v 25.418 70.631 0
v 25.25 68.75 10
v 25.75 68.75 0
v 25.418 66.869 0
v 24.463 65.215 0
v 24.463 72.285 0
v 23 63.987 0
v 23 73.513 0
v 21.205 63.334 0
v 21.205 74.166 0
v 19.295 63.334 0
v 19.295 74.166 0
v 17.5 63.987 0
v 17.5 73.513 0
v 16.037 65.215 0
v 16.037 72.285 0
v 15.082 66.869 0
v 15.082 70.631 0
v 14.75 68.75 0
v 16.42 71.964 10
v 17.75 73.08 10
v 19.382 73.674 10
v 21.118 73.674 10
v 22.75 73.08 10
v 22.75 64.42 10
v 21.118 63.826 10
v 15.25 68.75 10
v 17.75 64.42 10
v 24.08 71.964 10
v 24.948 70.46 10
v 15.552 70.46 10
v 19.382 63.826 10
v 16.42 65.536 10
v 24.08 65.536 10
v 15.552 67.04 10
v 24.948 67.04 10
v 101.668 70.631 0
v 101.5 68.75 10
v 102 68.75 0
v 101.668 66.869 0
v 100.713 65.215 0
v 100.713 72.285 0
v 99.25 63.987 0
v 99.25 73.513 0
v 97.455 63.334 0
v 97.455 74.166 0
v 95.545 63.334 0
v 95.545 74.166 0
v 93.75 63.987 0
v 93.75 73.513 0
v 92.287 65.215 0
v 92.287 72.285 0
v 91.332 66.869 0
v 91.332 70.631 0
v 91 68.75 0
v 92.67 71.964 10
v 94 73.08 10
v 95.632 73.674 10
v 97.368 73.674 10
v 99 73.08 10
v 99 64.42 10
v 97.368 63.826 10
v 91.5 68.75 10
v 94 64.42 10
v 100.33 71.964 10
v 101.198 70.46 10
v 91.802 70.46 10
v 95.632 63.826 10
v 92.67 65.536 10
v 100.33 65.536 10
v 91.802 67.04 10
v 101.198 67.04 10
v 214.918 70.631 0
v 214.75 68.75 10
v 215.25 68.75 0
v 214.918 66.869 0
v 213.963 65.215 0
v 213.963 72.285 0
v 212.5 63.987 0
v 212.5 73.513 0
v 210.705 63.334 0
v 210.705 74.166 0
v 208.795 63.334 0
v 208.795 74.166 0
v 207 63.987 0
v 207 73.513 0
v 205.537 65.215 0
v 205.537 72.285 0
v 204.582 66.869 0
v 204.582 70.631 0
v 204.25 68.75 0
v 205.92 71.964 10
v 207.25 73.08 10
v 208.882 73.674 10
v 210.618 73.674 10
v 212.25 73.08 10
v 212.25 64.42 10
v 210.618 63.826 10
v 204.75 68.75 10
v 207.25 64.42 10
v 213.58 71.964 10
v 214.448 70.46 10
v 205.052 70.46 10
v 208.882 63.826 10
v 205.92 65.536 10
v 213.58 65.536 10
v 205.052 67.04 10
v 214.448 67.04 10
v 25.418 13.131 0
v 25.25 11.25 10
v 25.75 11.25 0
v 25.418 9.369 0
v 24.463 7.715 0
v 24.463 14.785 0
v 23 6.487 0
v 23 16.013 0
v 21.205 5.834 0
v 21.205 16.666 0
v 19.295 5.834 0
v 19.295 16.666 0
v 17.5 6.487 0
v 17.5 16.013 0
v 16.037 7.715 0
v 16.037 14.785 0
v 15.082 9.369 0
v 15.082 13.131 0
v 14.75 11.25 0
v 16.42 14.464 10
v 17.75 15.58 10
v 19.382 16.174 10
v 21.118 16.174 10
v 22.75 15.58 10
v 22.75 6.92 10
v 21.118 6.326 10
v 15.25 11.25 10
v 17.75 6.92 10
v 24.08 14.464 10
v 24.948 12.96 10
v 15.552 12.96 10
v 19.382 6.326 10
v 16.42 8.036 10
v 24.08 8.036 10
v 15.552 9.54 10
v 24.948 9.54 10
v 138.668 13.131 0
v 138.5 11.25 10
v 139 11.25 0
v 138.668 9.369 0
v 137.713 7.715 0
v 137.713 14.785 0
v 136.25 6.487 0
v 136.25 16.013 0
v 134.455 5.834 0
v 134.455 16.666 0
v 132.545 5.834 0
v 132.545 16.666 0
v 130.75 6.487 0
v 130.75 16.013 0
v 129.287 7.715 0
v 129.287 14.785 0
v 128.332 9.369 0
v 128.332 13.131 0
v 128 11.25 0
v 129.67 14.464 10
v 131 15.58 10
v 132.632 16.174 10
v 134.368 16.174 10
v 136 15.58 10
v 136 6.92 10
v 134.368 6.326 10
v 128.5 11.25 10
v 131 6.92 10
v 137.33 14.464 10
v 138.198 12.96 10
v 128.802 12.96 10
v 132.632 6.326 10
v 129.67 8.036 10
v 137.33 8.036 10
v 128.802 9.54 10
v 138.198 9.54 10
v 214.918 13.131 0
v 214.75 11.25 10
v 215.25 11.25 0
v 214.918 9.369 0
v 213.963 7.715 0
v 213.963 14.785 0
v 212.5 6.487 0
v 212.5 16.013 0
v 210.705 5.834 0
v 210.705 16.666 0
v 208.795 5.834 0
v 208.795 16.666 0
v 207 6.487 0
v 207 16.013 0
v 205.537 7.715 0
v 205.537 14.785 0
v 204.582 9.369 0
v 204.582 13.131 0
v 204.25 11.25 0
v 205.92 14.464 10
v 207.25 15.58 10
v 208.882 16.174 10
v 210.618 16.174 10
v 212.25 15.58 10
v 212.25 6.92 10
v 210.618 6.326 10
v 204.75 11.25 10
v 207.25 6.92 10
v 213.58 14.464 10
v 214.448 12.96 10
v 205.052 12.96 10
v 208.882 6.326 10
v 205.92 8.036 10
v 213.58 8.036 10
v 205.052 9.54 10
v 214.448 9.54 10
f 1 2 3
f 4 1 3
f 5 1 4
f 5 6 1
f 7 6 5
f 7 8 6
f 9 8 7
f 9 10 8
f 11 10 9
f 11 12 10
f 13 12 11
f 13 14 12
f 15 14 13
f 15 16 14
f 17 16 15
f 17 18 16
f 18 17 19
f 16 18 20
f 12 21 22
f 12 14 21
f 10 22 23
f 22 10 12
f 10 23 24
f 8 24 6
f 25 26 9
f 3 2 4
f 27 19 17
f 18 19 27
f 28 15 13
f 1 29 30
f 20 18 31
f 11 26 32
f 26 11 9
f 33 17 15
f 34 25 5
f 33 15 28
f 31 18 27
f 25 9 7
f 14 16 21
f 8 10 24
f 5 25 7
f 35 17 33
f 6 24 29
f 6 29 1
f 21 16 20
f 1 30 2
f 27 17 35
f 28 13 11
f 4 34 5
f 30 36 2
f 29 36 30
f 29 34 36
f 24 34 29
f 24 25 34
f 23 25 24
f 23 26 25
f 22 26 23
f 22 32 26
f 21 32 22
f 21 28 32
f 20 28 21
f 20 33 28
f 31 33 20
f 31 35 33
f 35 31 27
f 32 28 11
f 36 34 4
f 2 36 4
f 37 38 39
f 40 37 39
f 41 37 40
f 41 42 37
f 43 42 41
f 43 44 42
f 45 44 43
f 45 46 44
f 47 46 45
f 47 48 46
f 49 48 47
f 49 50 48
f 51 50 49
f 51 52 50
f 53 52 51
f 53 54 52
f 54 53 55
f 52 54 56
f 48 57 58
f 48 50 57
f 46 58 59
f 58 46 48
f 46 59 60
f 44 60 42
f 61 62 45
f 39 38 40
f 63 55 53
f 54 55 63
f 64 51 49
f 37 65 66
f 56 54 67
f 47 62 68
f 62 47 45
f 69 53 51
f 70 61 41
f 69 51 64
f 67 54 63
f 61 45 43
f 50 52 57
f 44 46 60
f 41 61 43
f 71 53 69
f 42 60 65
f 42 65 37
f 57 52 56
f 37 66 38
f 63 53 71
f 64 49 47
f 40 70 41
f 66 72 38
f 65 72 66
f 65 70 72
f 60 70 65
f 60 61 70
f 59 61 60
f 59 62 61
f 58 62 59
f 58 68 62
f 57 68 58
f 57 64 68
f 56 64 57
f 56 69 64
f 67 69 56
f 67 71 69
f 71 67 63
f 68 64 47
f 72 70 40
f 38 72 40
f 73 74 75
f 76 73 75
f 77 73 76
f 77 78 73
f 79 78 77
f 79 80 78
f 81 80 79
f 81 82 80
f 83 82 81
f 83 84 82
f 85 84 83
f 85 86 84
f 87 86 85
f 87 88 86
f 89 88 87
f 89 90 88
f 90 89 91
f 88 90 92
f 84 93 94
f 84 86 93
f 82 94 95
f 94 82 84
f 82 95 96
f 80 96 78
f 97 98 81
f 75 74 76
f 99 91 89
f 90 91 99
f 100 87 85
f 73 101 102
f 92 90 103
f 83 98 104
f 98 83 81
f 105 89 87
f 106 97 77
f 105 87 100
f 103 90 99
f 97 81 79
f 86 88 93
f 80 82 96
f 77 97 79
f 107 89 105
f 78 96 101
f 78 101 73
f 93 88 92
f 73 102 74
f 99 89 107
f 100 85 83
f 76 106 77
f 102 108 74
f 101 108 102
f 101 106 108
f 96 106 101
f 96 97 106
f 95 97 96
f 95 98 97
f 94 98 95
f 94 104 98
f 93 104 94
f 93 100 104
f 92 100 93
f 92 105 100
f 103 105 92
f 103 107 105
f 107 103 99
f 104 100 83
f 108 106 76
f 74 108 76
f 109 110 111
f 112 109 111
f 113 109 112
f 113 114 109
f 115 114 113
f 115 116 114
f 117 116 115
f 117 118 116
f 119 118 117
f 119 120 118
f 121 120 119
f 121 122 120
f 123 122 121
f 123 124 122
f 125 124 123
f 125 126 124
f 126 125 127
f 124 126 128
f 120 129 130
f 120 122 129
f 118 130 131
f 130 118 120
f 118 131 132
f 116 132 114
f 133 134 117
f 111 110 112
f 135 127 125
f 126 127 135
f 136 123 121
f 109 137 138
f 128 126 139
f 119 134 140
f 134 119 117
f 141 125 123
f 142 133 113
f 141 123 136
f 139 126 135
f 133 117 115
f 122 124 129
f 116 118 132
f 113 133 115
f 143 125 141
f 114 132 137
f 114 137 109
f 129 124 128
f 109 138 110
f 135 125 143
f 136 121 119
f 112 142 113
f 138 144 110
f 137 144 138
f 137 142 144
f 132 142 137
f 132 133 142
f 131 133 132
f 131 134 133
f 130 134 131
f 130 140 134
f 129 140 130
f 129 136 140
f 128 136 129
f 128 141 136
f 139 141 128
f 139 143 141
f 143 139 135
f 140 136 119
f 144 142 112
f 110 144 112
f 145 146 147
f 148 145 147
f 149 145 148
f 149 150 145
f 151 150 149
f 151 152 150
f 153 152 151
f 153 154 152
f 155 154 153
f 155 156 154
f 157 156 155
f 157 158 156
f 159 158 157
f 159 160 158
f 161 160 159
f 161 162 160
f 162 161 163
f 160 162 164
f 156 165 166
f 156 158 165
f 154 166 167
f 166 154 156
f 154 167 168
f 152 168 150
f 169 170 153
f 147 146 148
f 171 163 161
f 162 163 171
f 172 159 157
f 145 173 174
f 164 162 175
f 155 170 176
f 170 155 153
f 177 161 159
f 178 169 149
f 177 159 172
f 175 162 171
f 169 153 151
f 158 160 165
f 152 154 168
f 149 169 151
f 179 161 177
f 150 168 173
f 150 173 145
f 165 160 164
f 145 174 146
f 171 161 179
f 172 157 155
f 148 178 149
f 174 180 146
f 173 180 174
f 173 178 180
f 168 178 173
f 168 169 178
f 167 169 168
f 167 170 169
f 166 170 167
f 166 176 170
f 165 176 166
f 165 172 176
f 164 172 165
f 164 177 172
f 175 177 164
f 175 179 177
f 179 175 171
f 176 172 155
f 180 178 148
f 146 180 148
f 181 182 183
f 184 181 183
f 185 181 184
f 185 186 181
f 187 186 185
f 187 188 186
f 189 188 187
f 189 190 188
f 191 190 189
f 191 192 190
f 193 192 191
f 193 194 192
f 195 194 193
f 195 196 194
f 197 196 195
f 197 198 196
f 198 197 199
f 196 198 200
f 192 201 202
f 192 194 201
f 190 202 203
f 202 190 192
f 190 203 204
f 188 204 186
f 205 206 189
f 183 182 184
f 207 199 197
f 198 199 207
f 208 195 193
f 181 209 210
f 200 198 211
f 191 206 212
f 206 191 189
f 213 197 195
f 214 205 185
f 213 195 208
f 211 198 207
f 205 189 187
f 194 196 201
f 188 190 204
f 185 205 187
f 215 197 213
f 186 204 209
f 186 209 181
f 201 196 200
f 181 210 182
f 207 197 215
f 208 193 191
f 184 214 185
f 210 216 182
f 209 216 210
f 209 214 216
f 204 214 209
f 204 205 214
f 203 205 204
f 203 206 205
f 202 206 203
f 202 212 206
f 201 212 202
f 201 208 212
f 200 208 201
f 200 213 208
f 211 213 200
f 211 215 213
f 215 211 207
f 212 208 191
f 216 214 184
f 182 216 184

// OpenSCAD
// file: parameters.scad
tolerance = 0.3;

threaded_insert_diameter = 6;

wall_depth = 5;
top_and_bottom_wall_depth = 3.5;

exterior_width = 255;
exterior_height = 211;

interior_width = exterior_width - (wall_depth * 2);
interior_height = exterior_height - (wall_depth * 2);
interior_depth = 28;

wedge_angle = 2;

interior_front_depth = interior_depth;
interior_back_depth = (exterior_height * tan(wedge_angle)) + interior_front_depth;

exterior_front_depth = interior_depth + (top_and_bottom_wall_depth * 2);
exterior_back_depth = (exterior_height * tan(wedge_angle)) + exterior_front_depth;

threaded_insert_post_diameter = threaded_insert_diameter + 5;

keyboard_width = 230;
keyboard_height = 78;

keyboard_x = (exterior_width / 2) - (keyboard_width / 2) - wall_depth;
keyboard_y = 20;

battery_pack_width = 87;
battery_pack_height = 63.65;

battery_x = interior_width - (battery_pack_width) - 15;
battery_y = interior_height - (battery_pack_height) - 16;

battery_pack_cover_width = battery_pack_width + 6;
battery_pack_cover_height = battery_pack_height + 6;
// main file
include <parameters.scad>

// These are relative to the keyboard position
keyboard_post_positions = [
    // top left
    [20.25, keyboard_height - 9.25],
    
    // top middle
    [96.50, keyboard_height - 9.25],
    
    // top right
    [keyboard_width - 20.25, keyboard_height - 9.25],
    
    // bottom left
    [20.25, 11.25],
    
    // bottom middle
    [keyboard_width - 96.50, 11.25],
    
    // bottom right
    [keyboard_width - 20.25, 11.25]
];

module keyboard_posts() {
    for (i = keyboard_post_positions) {
        x = i[0];
        y = i[1];
        translate([x, y, 0])
            color("yellow")
            cylinder(h=10, r1=threaded_insert_post_diameter / 2, r2=(threaded_insert_post_diameter - 1) / 2);
    }
}

module keyboard_mount(position = [0, 0, 0]) {
    keyboard_posts();
}

module keyboard_cutout(position = [0, 0, 0], size = [0, 0, 0]) {
    cube([keyboard_width, keyboard_height, 80]);
}

%keyboard_cutout();
keyboard_mount();
